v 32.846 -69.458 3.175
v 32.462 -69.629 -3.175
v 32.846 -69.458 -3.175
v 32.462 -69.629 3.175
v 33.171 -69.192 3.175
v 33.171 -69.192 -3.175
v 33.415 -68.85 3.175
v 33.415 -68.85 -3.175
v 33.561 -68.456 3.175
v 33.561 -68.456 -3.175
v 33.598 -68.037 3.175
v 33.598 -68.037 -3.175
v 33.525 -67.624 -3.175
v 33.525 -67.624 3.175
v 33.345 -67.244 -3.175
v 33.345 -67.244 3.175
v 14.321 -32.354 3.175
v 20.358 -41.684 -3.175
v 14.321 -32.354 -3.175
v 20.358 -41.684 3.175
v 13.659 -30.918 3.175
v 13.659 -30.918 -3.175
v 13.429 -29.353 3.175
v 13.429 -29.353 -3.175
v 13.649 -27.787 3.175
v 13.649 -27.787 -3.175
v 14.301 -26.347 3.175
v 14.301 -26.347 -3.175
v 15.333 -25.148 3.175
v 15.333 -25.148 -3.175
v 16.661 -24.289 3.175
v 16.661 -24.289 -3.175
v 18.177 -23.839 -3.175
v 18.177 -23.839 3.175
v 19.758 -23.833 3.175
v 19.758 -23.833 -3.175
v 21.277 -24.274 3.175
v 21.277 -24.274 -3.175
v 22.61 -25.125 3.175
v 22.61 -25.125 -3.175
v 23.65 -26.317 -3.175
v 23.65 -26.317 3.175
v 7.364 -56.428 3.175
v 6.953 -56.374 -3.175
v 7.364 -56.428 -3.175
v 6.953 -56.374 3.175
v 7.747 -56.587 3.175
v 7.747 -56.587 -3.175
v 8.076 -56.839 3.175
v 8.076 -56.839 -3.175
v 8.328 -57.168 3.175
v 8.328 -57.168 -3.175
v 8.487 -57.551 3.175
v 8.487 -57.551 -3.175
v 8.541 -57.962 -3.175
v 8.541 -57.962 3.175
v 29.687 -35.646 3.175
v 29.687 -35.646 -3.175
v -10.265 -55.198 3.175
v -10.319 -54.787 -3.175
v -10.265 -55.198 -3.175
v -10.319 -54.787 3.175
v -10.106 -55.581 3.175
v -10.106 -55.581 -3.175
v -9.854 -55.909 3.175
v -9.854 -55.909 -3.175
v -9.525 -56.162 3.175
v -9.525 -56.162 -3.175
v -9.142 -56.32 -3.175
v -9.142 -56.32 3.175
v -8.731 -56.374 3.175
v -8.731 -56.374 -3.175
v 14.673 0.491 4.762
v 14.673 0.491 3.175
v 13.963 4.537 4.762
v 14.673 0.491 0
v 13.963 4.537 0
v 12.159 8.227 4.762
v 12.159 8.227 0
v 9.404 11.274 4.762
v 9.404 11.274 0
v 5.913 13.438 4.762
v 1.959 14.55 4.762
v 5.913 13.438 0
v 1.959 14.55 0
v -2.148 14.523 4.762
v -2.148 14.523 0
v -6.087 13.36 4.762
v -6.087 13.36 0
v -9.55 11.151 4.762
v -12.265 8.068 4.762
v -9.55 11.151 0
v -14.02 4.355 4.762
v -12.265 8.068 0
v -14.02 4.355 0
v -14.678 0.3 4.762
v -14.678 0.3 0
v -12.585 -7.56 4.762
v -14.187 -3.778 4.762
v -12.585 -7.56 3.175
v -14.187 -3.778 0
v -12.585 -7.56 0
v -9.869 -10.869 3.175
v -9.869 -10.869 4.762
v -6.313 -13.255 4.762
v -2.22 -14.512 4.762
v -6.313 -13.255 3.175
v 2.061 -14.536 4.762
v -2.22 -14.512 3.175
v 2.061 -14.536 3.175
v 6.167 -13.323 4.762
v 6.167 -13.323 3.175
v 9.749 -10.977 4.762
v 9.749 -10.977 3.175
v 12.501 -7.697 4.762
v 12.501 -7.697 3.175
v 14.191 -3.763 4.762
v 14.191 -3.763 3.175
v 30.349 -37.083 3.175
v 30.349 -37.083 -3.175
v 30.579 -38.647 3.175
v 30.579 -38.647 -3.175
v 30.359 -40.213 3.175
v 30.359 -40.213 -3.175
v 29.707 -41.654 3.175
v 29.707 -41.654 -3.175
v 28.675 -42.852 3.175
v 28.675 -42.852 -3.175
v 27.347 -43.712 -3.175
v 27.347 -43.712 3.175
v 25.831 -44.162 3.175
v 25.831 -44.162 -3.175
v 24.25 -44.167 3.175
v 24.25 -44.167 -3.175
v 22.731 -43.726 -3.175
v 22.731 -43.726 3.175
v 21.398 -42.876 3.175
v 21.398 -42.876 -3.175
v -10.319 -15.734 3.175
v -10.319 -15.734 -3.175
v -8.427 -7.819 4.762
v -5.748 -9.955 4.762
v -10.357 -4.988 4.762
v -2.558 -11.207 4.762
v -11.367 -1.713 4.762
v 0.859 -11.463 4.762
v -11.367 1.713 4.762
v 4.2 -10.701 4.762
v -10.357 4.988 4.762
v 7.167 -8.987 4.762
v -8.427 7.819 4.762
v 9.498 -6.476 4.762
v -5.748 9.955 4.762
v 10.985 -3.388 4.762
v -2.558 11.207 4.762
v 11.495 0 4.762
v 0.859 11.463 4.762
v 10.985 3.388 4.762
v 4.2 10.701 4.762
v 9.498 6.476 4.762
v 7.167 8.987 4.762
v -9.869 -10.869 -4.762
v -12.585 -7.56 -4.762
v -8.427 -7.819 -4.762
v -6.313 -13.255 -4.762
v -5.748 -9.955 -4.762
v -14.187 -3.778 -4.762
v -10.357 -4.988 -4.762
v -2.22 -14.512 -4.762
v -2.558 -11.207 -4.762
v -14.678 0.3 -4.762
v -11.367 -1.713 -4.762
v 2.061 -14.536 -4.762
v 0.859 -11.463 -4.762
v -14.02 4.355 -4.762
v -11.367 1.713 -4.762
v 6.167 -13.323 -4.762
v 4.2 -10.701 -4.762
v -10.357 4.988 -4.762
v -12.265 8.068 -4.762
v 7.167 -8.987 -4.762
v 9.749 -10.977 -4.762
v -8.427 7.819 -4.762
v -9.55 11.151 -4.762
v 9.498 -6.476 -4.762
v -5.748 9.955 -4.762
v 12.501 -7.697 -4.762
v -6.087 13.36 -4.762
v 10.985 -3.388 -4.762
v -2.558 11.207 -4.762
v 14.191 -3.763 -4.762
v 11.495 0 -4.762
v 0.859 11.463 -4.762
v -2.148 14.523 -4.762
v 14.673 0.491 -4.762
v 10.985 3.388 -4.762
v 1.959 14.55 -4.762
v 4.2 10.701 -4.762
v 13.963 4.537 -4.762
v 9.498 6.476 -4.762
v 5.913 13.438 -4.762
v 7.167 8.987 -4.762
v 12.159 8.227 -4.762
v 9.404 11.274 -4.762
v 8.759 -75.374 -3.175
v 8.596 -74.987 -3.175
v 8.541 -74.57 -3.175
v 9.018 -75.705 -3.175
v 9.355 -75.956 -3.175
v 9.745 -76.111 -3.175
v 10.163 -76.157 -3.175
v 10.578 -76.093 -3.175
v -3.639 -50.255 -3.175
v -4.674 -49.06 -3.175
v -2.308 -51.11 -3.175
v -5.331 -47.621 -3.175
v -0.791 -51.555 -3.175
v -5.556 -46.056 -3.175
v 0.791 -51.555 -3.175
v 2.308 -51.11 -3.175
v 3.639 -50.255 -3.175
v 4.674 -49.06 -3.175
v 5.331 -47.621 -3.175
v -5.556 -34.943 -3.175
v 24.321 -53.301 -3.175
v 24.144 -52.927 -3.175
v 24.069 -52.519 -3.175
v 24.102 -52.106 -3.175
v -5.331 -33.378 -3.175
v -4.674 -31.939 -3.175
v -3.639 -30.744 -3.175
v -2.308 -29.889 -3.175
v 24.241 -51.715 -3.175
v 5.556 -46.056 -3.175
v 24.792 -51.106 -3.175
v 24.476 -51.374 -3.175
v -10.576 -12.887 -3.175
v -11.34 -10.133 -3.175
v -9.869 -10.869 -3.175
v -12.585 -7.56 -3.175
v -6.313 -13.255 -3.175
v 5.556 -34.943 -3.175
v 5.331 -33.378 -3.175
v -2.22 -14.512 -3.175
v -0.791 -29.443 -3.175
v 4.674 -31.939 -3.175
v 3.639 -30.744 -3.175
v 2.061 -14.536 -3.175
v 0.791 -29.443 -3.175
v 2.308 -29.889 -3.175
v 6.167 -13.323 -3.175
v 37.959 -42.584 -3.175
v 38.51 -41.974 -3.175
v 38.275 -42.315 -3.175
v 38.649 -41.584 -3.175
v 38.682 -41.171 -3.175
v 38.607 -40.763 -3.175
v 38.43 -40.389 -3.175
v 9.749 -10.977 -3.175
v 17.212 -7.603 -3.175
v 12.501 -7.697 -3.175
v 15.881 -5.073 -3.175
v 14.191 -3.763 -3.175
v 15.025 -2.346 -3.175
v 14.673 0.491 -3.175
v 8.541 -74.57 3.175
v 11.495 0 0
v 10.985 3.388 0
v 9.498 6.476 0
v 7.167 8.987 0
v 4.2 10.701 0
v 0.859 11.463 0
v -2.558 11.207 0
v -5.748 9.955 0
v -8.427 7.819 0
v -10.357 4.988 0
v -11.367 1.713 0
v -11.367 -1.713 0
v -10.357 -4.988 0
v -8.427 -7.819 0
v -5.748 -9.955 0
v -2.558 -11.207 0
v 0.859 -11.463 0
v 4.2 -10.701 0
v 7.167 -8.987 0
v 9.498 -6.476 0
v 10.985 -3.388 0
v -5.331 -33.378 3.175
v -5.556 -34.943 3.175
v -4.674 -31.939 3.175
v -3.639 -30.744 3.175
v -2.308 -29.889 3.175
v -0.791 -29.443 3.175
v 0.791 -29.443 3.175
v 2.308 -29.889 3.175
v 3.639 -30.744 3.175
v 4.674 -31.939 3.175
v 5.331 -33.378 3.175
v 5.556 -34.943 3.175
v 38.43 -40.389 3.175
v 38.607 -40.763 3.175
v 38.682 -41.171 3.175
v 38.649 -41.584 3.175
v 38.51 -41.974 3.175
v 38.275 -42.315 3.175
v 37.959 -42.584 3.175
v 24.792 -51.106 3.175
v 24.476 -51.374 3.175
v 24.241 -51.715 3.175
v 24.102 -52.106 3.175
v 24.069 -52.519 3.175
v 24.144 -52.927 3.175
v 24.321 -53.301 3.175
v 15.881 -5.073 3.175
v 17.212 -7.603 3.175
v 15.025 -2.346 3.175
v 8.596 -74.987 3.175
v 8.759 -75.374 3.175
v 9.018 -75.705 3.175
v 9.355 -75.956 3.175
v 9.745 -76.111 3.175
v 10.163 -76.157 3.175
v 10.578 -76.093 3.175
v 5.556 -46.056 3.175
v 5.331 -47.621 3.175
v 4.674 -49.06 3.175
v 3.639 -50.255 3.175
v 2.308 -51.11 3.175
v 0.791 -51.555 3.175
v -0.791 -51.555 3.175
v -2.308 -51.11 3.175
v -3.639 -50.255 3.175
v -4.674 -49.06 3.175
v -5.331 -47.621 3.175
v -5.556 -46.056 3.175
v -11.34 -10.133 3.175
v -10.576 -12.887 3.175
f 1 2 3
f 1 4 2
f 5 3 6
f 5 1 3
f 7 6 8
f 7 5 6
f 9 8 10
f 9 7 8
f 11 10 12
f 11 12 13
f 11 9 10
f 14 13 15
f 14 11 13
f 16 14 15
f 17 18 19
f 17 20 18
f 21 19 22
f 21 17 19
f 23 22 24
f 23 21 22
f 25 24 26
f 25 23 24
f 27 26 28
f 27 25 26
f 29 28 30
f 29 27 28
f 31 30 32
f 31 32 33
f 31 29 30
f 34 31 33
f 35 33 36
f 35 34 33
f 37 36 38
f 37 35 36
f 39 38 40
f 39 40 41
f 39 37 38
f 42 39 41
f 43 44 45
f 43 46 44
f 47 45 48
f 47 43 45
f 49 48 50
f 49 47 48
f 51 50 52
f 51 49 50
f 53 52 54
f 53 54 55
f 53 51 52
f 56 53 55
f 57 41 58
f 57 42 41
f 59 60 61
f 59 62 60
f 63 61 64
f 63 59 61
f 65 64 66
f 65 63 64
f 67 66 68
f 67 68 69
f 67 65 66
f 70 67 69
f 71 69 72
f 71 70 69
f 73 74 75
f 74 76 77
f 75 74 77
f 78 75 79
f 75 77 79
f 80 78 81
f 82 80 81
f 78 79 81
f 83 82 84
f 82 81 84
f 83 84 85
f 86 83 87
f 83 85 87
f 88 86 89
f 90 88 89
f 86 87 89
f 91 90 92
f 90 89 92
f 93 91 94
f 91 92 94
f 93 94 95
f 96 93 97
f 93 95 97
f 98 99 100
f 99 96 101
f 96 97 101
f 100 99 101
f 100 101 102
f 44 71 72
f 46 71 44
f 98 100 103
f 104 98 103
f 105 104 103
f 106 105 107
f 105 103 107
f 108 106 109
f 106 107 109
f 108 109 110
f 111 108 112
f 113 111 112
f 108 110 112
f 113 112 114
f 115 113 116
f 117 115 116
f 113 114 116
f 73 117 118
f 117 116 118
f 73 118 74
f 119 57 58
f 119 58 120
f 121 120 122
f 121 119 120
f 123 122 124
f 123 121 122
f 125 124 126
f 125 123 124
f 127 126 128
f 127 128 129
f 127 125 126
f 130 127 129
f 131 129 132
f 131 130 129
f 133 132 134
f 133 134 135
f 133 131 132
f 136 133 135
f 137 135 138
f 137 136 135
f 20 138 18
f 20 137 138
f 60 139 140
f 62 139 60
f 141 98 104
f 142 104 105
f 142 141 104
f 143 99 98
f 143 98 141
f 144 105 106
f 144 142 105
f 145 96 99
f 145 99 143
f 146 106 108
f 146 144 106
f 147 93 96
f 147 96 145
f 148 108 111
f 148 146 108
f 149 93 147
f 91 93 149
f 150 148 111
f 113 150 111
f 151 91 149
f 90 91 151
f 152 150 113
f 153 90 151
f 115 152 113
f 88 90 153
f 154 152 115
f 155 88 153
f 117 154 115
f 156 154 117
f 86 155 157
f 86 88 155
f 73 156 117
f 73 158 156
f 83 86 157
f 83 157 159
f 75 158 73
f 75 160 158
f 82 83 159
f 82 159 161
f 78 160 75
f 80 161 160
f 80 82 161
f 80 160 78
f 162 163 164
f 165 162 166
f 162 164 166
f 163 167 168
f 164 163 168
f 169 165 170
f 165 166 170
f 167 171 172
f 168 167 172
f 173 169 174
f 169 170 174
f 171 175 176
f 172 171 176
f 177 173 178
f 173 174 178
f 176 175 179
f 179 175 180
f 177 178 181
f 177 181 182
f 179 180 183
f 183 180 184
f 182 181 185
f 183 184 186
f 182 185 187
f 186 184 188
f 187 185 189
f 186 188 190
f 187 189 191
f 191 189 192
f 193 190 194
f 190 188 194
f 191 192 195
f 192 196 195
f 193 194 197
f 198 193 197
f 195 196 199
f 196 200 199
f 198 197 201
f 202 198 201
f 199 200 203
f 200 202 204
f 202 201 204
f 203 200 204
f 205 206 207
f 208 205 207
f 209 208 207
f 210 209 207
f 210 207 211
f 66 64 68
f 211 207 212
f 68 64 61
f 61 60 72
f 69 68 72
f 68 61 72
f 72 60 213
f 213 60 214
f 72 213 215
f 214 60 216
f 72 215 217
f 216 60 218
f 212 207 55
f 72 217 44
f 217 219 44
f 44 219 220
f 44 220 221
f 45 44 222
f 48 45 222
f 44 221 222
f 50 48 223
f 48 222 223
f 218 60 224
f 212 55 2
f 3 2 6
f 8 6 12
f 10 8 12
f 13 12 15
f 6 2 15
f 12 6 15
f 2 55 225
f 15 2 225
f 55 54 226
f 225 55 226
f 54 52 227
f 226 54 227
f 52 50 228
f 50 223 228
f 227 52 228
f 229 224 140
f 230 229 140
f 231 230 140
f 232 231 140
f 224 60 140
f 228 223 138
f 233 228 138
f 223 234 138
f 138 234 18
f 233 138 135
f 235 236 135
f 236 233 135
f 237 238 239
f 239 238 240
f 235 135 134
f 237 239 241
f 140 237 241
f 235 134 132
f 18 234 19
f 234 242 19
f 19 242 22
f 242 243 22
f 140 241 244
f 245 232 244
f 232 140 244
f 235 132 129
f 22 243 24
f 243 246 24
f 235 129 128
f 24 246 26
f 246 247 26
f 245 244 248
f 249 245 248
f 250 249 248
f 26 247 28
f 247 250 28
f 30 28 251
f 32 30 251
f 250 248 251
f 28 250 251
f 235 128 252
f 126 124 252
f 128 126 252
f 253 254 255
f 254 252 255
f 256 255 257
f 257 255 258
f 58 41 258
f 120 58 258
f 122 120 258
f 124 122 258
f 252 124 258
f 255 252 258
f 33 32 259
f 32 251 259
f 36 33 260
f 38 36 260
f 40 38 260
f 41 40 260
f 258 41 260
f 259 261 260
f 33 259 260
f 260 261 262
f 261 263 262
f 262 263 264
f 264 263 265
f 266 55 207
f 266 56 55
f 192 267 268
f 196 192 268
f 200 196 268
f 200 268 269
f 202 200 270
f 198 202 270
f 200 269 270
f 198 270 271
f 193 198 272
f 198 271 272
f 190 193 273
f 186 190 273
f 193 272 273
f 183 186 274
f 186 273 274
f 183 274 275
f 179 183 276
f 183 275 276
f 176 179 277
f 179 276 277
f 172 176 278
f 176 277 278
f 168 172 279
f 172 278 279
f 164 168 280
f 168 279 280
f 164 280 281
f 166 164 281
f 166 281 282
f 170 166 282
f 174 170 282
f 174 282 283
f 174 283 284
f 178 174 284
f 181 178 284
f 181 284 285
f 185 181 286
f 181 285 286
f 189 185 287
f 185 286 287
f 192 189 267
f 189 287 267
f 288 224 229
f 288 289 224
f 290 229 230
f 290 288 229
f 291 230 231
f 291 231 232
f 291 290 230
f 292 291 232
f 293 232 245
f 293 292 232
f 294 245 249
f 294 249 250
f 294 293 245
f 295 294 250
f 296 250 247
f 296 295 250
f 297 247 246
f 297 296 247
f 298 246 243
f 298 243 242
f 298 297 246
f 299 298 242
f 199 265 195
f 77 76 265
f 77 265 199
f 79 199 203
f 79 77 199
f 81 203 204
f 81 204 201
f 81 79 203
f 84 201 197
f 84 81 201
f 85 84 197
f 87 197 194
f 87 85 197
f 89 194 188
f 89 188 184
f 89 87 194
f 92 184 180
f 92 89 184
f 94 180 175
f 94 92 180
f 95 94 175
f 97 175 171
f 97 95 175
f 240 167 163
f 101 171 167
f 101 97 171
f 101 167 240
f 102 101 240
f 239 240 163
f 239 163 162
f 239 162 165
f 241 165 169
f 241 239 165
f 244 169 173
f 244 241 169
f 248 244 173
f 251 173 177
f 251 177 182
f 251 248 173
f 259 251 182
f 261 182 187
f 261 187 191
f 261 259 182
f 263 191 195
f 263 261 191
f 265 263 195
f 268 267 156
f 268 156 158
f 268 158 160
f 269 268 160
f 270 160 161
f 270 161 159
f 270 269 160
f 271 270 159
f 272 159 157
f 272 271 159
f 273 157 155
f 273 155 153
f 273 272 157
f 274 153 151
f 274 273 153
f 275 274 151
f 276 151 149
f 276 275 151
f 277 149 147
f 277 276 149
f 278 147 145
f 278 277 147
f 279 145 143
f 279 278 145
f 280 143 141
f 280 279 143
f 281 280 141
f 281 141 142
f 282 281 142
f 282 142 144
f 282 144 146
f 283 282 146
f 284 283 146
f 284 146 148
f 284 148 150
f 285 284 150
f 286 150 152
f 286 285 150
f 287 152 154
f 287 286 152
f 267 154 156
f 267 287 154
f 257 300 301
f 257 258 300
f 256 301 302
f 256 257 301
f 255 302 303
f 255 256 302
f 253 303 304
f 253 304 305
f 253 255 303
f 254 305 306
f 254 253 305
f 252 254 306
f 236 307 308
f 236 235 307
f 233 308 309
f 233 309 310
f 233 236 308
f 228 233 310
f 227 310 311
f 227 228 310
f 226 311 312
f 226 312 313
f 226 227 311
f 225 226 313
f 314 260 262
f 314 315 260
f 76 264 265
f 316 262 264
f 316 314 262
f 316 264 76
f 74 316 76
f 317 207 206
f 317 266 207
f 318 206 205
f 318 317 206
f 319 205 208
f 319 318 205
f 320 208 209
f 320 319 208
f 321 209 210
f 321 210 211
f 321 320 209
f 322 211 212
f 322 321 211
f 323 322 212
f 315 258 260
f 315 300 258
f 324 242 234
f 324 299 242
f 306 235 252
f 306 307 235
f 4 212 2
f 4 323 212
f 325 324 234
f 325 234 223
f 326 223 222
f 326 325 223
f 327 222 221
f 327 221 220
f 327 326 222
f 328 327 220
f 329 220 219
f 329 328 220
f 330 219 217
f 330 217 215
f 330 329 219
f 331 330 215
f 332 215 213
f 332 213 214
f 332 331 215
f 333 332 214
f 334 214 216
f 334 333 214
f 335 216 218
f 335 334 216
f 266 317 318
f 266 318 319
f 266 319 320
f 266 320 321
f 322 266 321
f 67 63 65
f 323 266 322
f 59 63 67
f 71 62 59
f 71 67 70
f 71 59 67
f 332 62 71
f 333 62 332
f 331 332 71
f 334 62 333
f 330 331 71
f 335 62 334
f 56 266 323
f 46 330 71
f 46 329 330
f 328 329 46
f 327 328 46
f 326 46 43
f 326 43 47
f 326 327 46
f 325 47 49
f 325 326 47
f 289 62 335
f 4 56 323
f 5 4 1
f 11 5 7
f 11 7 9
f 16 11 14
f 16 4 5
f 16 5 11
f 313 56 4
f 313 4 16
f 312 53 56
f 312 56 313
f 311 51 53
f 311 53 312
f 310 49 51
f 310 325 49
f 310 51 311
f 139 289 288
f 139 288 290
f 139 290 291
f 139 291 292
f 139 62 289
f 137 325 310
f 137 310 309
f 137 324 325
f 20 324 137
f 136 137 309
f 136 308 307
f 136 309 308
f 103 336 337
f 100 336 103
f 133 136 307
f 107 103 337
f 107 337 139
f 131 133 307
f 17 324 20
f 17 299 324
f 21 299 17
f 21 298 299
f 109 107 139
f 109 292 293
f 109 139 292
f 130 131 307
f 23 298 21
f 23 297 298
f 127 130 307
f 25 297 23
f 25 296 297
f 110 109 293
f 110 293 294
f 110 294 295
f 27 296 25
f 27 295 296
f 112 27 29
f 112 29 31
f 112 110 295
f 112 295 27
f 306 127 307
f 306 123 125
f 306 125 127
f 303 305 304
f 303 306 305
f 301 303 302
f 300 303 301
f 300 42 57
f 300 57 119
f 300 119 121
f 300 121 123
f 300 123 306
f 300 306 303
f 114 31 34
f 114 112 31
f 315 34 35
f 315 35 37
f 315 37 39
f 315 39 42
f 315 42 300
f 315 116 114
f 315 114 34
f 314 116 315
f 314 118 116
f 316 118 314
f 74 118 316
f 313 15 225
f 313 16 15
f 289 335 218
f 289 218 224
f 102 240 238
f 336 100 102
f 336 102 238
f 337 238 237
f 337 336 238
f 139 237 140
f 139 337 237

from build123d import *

# Parameters (mm, degrees)
SKETCH1_R           = 11.495405
BOSS_EXTRUDE2_DEPTH = 4.7625
BOSS_EXTRUDE3_DEPTH = 3.175
FILLET1_R           = 1.5875


with BuildPart() as part:
    # Sketch1 → Boss-Extrude2 (new body, symmetric)
    with BuildSketch(Plane.XY):
        with BuildLine():
            ThreePointArc((14.672983865, 0.491098707), (-4.158599684, 14.079903484), (-12.585193267, -7.559797873))
            ThreePointArc((-12.585193267, -7.559797873), (4.158599684, -14.079903484), (14.672983865, 0.491098707))
        make_face()
        Circle(SKETCH1_R, mode=Mode.SUBTRACT)
    extrude(amount=BOSS_EXTRUDE2_DEPTH, both=True)

    # Sketch1<4> → Boss-Extrude3 (add, symmetric)
    with BuildSketch(Plane.XY):
        with BuildLine():
            ThreePointArc((-12.585193267, -7.559797873), (-10.89585042, -11.492870345), (-10.31875, -15.734319794))
            Line((-10.31875, -15.734319794), (-10.31875, -56.374319794))
            Line((-10.31875, -56.374319794), (8.54075, -56.374319794))
            Line((8.54075, -56.374319794), (8.54075, -76.694319794))
            Line((8.54075, -76.694319794), (34.499171822, -69.027315193))
            Line((34.499171822, -69.027315193), (23.458960581, -51.968120144))
            Line((23.458960581, -51.968120144), (39.292025986, -41.721424085))
            Line((39.292025986, -41.721424085), (17.211603503, -7.603033986))
            ThreePointArc((17.211603503, -7.603033986), (15.391641433, -3.728672569), (14.672983865, 0.491098707))
            ThreePointArc((14.672983865, 0.491098707), (4.158599684, -14.079903484), (-12.585193267, -7.559797873))
        make_face()
        with BuildLine():
            ThreePointArc((5.55625, -46.055569794), (0, -51.611819794), (-5.55625, -46.055569794))
            Line((-5.55625, -46.055569794), (-5.55625, -34.943069794))
            ThreePointArc((-5.55625, -34.943069794), (0, -29.386819794), (5.55625, -34.943069794))
            Line((5.55625, -34.943069794), (5.55625, -46.055569794))
        make_face(mode=Mode.SUBTRACT)
        with BuildLine():
            ThreePointArc((29.687419875, -35.646101109), (28.04160399, -43.329532516), (20.358172583, -41.683716631))
            Line((20.358172583, -41.683716631), (14.32055706, -32.354469339))
            ThreePointArc((14.32055706, -32.354469339), (15.966372945, -24.671037931), (23.649804353, -26.316853816))
            Line((23.649804353, -26.316853816), (29.687419875, -35.646101109))
        make_face(mode=Mode.SUBTRACT)
    extrude(amount=BOSS_EXTRUDE3_DEPTH, both=True)

    # Fillet1
    fillet1_edges = [part.edges().sort_by_distance(p)[0] for p in [
        (34.499171822, -69.027315193, 0),
        (23.458960581, -51.968120144, 0),
        (39.292025986, -41.721424085, 0),
        (-10.31875, -56.374319794, 0),
        (8.54075, -56.374319794, 0),
        (8.54075, -76.694319794, 0),
    ]]
    fillet(fillet1_edges, radius=FILLET1_R)


solid = part.part
